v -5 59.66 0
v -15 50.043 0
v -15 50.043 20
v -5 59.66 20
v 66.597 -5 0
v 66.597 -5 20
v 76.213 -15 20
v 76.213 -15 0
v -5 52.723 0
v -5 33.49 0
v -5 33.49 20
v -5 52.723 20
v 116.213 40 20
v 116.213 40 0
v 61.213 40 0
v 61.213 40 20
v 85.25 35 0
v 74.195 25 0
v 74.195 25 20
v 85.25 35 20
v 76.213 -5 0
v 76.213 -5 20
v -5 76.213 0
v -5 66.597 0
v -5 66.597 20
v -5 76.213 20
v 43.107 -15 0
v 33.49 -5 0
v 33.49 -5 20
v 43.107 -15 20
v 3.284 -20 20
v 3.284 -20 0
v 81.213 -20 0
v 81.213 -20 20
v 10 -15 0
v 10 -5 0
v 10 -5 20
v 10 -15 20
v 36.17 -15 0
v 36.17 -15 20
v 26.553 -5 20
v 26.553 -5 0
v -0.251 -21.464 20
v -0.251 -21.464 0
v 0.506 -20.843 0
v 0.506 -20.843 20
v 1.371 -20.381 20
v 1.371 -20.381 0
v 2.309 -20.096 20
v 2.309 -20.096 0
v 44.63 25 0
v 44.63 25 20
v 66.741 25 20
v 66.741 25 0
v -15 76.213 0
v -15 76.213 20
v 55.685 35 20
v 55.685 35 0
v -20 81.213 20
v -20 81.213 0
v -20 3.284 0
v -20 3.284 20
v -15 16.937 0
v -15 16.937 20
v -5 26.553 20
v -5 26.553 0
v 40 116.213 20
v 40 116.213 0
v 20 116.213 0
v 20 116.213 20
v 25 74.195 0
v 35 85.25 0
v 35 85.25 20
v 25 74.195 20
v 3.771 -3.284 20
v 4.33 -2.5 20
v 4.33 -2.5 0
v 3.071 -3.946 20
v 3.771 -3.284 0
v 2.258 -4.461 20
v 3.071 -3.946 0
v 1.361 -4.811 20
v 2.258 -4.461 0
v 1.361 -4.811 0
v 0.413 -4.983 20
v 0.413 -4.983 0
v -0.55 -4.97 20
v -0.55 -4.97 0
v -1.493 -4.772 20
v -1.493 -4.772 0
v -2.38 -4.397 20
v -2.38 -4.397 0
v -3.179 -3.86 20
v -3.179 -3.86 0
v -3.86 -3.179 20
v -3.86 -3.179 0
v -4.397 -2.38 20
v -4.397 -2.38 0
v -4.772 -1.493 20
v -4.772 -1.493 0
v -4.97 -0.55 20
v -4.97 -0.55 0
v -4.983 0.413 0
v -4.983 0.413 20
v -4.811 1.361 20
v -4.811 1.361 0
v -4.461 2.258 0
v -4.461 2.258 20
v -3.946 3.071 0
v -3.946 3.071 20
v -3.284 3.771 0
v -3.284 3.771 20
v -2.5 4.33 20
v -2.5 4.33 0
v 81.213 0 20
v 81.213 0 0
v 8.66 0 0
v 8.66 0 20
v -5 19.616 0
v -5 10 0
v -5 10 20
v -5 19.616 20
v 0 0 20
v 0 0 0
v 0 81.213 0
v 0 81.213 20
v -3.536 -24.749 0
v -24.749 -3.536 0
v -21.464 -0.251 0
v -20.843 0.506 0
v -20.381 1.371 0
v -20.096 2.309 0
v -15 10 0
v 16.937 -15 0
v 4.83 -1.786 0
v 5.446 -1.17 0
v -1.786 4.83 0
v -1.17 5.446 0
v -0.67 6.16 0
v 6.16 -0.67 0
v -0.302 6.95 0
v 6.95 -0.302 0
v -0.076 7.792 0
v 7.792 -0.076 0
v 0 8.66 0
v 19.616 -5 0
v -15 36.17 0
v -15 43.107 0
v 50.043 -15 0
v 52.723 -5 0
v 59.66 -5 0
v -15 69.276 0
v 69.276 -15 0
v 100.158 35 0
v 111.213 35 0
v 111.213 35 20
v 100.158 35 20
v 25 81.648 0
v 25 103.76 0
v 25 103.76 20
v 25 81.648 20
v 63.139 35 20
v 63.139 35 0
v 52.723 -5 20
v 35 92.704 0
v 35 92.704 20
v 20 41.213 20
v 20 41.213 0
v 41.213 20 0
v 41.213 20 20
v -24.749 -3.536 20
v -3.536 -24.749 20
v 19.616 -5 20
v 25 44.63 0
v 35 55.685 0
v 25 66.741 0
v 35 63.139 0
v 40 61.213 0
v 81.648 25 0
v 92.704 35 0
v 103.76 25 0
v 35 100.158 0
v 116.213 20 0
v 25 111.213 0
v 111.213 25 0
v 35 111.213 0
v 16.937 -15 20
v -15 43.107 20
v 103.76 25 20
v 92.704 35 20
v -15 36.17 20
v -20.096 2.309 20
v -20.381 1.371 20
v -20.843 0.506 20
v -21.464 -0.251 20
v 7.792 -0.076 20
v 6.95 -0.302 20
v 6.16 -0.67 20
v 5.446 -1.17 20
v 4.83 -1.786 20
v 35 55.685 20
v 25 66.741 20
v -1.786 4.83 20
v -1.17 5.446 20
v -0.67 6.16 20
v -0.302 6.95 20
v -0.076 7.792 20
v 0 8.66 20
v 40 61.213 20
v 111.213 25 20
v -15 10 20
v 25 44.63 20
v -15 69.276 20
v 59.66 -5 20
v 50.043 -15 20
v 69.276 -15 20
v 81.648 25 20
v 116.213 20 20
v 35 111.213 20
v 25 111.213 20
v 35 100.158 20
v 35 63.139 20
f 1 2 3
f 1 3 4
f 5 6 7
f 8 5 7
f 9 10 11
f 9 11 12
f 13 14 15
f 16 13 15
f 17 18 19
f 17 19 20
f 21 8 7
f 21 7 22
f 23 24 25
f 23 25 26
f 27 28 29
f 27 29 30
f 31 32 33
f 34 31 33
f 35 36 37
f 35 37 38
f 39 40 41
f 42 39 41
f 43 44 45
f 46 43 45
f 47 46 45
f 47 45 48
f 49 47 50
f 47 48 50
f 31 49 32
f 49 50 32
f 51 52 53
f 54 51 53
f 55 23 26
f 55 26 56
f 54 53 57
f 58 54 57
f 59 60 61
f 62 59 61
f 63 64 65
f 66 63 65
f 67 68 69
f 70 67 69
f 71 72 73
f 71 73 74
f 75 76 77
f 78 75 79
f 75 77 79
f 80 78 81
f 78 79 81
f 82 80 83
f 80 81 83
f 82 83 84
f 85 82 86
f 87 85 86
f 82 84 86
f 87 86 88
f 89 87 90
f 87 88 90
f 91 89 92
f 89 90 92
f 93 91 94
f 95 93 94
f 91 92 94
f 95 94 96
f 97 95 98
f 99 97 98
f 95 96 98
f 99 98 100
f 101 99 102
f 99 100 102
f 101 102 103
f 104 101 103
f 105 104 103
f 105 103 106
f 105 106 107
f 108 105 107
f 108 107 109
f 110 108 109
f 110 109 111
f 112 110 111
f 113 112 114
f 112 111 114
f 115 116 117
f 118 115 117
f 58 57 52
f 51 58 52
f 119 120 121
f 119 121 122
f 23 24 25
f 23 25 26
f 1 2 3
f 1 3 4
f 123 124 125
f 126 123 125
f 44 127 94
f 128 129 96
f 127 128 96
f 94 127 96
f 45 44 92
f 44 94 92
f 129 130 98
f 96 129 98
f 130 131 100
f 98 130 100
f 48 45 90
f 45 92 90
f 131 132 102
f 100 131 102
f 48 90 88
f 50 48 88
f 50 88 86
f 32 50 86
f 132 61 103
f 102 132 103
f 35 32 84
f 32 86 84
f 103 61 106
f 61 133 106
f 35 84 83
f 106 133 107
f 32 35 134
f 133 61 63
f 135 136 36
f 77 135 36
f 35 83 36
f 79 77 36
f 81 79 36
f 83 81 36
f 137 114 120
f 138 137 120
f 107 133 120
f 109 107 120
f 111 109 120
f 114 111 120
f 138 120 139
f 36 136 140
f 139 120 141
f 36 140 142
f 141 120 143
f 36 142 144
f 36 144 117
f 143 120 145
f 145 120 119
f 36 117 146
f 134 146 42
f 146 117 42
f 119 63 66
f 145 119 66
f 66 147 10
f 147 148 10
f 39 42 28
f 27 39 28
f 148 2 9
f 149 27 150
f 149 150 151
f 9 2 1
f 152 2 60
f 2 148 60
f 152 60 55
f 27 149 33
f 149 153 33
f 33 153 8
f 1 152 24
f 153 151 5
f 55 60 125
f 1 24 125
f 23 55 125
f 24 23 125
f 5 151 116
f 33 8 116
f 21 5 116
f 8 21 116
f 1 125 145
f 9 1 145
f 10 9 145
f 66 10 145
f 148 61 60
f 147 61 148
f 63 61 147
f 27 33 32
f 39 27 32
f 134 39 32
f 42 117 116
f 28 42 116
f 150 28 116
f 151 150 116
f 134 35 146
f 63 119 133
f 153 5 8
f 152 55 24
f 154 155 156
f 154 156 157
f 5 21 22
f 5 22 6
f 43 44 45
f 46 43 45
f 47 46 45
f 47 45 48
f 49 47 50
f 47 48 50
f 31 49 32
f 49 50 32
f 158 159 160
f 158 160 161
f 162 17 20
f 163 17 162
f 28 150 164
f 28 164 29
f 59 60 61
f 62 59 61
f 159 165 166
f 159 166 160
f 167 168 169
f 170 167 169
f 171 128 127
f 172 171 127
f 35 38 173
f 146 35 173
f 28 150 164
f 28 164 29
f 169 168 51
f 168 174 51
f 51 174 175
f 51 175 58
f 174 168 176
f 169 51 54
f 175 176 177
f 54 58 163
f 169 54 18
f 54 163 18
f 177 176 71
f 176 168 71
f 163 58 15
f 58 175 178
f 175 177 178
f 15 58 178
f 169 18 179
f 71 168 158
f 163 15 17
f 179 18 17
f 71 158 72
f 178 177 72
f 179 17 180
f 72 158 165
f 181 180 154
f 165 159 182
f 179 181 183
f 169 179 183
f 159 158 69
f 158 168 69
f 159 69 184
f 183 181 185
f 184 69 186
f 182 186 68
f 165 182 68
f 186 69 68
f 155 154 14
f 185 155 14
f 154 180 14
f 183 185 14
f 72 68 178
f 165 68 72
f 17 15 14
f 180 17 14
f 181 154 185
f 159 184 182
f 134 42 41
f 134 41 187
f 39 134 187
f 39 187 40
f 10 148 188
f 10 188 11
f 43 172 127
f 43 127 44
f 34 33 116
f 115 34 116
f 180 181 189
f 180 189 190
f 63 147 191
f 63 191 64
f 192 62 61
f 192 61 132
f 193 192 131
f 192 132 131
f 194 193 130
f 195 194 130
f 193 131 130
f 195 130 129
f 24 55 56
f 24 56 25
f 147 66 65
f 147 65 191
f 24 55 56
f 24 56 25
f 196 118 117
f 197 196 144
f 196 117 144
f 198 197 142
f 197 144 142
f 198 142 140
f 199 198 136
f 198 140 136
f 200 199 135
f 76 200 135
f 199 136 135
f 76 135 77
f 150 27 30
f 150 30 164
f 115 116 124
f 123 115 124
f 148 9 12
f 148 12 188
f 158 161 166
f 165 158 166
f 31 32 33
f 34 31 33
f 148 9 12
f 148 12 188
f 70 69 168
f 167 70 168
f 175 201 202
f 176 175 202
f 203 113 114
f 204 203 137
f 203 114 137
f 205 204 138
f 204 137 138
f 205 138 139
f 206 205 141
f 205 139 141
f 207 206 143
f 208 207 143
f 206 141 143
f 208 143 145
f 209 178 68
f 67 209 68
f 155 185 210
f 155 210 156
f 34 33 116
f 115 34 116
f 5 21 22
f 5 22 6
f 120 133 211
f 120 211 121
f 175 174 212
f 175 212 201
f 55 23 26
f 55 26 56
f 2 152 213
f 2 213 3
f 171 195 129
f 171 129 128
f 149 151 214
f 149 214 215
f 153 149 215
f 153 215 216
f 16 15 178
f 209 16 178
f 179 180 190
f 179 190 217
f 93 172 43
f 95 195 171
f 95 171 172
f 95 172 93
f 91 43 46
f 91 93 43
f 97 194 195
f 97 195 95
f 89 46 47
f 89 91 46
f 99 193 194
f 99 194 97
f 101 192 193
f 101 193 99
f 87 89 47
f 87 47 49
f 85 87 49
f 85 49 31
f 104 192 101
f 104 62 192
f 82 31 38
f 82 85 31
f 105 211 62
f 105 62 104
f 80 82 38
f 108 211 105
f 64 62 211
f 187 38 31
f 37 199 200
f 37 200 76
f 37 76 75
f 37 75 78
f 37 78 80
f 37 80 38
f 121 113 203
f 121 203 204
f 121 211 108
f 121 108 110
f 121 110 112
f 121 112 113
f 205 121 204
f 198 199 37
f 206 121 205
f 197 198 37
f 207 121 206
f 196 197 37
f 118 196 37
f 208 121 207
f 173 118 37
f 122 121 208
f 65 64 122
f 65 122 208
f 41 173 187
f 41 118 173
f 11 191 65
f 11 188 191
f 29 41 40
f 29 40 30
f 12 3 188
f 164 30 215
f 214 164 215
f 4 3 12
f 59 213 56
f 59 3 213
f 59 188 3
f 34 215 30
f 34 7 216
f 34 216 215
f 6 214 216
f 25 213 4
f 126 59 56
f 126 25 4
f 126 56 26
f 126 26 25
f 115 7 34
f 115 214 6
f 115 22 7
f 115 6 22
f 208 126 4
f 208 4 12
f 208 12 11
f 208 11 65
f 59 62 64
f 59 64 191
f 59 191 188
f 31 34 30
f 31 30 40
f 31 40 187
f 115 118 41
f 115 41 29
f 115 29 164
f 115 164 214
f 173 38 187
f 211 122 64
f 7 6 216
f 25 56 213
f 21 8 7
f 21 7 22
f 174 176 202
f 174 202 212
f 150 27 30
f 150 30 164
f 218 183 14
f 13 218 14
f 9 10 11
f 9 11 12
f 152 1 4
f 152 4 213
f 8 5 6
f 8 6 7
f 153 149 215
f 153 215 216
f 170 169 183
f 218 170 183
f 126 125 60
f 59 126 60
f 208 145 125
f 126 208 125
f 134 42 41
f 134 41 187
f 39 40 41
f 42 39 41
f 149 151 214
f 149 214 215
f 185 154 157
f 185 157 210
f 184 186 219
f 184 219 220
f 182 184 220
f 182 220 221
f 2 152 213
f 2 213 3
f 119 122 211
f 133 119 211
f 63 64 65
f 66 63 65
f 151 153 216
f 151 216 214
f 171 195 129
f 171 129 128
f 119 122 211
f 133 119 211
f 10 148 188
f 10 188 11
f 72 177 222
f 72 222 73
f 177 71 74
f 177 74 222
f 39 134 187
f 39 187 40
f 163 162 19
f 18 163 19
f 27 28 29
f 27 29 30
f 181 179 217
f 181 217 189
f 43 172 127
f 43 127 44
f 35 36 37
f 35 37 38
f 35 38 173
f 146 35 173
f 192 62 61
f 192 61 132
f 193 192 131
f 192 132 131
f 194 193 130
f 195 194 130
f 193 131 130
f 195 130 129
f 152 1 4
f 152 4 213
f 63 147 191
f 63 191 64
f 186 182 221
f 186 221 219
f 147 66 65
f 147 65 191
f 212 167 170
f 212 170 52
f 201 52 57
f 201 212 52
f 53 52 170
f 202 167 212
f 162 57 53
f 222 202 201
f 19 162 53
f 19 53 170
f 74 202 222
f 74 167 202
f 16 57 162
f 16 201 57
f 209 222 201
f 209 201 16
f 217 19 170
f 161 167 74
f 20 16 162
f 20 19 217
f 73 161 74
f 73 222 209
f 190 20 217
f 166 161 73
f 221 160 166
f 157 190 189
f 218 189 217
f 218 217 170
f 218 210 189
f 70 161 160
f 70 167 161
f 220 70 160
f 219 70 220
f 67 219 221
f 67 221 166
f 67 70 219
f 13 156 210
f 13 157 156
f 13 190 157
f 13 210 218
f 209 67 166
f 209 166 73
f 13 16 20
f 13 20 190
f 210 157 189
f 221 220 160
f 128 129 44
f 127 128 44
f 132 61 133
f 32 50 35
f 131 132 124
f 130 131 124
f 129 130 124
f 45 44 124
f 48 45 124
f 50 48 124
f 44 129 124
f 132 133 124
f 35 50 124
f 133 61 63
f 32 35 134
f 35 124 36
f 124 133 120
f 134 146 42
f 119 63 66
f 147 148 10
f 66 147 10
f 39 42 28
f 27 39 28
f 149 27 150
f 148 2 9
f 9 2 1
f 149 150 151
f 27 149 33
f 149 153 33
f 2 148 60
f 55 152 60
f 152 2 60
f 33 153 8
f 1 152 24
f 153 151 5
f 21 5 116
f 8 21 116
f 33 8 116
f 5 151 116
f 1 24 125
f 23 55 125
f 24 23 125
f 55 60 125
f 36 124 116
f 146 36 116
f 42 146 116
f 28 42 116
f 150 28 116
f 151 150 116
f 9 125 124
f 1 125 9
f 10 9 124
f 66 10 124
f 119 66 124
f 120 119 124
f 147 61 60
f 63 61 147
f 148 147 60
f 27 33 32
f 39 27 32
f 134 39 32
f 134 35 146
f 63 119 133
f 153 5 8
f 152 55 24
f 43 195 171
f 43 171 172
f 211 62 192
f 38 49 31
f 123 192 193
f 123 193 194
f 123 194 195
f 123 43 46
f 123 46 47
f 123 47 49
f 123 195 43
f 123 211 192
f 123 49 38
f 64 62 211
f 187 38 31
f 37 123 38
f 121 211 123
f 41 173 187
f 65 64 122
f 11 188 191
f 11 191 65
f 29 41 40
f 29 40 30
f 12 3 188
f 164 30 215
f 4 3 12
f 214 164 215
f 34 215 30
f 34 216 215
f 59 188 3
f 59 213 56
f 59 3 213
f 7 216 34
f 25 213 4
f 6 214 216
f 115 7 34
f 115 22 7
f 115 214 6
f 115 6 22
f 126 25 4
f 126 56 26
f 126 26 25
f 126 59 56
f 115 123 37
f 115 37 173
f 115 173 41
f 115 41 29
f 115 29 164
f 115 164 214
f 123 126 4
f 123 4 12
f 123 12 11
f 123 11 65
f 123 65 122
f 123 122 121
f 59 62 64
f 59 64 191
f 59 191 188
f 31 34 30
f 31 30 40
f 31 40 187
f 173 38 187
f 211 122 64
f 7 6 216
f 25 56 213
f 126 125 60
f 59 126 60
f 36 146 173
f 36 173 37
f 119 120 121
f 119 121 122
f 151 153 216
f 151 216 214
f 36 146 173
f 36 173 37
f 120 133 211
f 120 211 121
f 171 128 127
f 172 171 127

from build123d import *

# Parameters (mm, degrees)
F3_DEPTH = 20
F4_DEPTH = 20
F6_DEPTH = 20


with BuildPart() as f3:
    # F2 (on Top) → F3 (new body)
    with BuildSketch(Plane.XY):
        Polygon((40, 61.2132034356), (40, 116.2132034356), (20, 116.2132034356), (20, 41.2132034356), (41.2132034356, 20), (116.2132034356, 20), (116.2132034356, 40), (61.2132034356, 40), align=None)
    extrude(amount=F3_DEPTH)


with BuildPart() as f3b:
    # F2 (on Top) → F3, piece 2 (new body)
    with BuildSketch(Plane.XY):
        with BuildLine():
            Line((81.2132034356, 0), (0, 0))
            Line((0, 0), (0, 81.2132034356))
            Line((0, 81.2132034356), (-20, 81.2132034356))
            Line((-20, 81.2132034356), (-20, 3.2842712475))
            ThreePointArc((-20, 3.2842712475), (-20.3806023374, 1.3708540856), (-21.4644660941, -0.2512626585))
            Line((-21.4644660941, -0.2512626585), (-24.7487373415, -3.5355339059))
            Line((-24.7487373415, -3.5355339059), (-3.5355339059, -24.7487373415))
            Line((-3.5355339059, -24.7487373415), (-0.2512626585, -21.4644660941))
            ThreePointArc((-0.2512626585, -21.4644660941), (1.3708540856, -20.3806023374), (3.2842712475, -20))
            Line((3.2842712475, -20), (81.2132034356, -20))
            Line((81.2132034356, -20), (81.2132034356, 0))
        make_face()
    extrude(amount=F3_DEPTH)


with BuildPart() as f4:
    # F1 (on Top) → F4 (new body)
    with BuildSketch(Plane.XY):
        with BuildLine():
            ThreePointArc((-2.5, 4.3301270189), (-0.6698729811, 6.1602540378), (0, 8.6602540378))
            Line((0, 8.6602540378), (0, 81.2132034356))
            Line((0, 81.2132034356), (-20, 81.2132034356))
            Line((-20, 81.2132034356), (-20, 3.2842712475))
            ThreePointArc((-20, 3.2842712475), (-20.3806023374, 1.3708540856), (-21.4644660941, -0.2512626585))
            Line((-21.4644660941, -0.2512626585), (-24.7487373415, -3.5355339059))
            Line((-24.7487373415, -3.5355339059), (-3.5355339059, -24.7487373415))
            Line((-3.5355339059, -24.7487373415), (-0.2512626585, -21.4644660941))
            ThreePointArc((-0.2512626585, -21.4644660941), (1.3708540856, -20.3806023374), (3.2842712475, -20))
            Line((3.2842712475, -20), (81.2132034356, -20))
            Line((81.2132034356, -20), (81.2132034356, 0))
            Line((81.2132034356, 0), (8.6602540378, 0))
            ThreePointArc((8.6602540378, 0), (6.1602540378, -0.6698729811), (4.3301270189, -2.5))
            ThreePointArc((4.3301270189, -2.5), (-3.5355339059, -3.5355339059), (-2.5, 4.3301270189))
        make_face()
    extrude(amount=F4_DEPTH)


with BuildPart() as f6_tool:
    # F5 (on Top) → F6 (new body, symmetric)
    with BuildSketch(Plane.XY):
        Polygon((-15, 10), (-5, 10), (-5, 19.6164966863), align=None)
        Polygon((-15, 36.1697975452), (-15, 16.9368041726), (-5, 26.5533008589), align=None)
        Polygon((-5, 52.7230984041), (-15, 43.1066017178), (-5, 33.4901050315), align=None)
        Polygon((-15, 69.276399263), (-15, 50.0434058904), (-5, 59.6599025767), align=None)
        Polygon((-5, 76.2132034356), (-15, 76.2132034356), (-5, 66.5967067493), align=None)
        Polygon((52.7230984041, -5), (33.4901050315, -5), (43.1066017178, -15), align=None)
        Polygon((76.2132034356, -15), (76.2132034356, -5), (66.5967067493, -5), align=None)
        Polygon((36.1697975452, -15), (26.5533008589, -5), (16.9368041726, -15), align=None)
        Polygon((10, -5), (10, -15), (19.6164966863, -5), align=None)
        Polygon((59.6599025767, -5), (50.0434058904, -15), (69.276399263, -15), align=None)
        Polygon((25, 66.7410194222), (25, 44.6297554757), (35, 55.685387449), align=None)
        Polygon((35, 85.2502914178), (25, 74.1946594445), (35, 63.1390274713), align=None)
        Polygon((25, 103.7595634133), (25, 81.6482994668), (35, 92.7039314401), align=None)
        Polygon((35, 111.2132034356), (25, 111.2132034356), (35, 100.1575714624), align=None)
        Polygon((63.1390274713, 35), (74.1946594445, 25), (85.2502914178, 35), align=None)
        Polygon((92.7039314401, 35), (81.6482994668, 25), (103.7595634133, 25), align=None)
        Polygon((111.2132034356, 25), (111.2132034356, 35), (100.1575714624, 35), align=None)
        Polygon((44.6297554757, 25), (66.7410194222, 25), (55.685387449, 35), align=None)
    extrude(amount=F6_DEPTH, both=True)


with BuildPart() as f3_1:
    add(f3.part)

    # F6: cut by f6_tool
    add(f6_tool.part, mode=Mode.SUBTRACT)


with BuildPart() as f3b_1:
    add(f3b.part)

    # F6: cut by f6_tool
    add(f6_tool.part, mode=Mode.SUBTRACT)


with BuildPart() as f4_1:
    add(f4.part)

    # F6: cut by f6_tool
    add(f6_tool.part, mode=Mode.SUBTRACT)


solid = Compound([f3_1.part, f3b_1.part, f4_1.part])
